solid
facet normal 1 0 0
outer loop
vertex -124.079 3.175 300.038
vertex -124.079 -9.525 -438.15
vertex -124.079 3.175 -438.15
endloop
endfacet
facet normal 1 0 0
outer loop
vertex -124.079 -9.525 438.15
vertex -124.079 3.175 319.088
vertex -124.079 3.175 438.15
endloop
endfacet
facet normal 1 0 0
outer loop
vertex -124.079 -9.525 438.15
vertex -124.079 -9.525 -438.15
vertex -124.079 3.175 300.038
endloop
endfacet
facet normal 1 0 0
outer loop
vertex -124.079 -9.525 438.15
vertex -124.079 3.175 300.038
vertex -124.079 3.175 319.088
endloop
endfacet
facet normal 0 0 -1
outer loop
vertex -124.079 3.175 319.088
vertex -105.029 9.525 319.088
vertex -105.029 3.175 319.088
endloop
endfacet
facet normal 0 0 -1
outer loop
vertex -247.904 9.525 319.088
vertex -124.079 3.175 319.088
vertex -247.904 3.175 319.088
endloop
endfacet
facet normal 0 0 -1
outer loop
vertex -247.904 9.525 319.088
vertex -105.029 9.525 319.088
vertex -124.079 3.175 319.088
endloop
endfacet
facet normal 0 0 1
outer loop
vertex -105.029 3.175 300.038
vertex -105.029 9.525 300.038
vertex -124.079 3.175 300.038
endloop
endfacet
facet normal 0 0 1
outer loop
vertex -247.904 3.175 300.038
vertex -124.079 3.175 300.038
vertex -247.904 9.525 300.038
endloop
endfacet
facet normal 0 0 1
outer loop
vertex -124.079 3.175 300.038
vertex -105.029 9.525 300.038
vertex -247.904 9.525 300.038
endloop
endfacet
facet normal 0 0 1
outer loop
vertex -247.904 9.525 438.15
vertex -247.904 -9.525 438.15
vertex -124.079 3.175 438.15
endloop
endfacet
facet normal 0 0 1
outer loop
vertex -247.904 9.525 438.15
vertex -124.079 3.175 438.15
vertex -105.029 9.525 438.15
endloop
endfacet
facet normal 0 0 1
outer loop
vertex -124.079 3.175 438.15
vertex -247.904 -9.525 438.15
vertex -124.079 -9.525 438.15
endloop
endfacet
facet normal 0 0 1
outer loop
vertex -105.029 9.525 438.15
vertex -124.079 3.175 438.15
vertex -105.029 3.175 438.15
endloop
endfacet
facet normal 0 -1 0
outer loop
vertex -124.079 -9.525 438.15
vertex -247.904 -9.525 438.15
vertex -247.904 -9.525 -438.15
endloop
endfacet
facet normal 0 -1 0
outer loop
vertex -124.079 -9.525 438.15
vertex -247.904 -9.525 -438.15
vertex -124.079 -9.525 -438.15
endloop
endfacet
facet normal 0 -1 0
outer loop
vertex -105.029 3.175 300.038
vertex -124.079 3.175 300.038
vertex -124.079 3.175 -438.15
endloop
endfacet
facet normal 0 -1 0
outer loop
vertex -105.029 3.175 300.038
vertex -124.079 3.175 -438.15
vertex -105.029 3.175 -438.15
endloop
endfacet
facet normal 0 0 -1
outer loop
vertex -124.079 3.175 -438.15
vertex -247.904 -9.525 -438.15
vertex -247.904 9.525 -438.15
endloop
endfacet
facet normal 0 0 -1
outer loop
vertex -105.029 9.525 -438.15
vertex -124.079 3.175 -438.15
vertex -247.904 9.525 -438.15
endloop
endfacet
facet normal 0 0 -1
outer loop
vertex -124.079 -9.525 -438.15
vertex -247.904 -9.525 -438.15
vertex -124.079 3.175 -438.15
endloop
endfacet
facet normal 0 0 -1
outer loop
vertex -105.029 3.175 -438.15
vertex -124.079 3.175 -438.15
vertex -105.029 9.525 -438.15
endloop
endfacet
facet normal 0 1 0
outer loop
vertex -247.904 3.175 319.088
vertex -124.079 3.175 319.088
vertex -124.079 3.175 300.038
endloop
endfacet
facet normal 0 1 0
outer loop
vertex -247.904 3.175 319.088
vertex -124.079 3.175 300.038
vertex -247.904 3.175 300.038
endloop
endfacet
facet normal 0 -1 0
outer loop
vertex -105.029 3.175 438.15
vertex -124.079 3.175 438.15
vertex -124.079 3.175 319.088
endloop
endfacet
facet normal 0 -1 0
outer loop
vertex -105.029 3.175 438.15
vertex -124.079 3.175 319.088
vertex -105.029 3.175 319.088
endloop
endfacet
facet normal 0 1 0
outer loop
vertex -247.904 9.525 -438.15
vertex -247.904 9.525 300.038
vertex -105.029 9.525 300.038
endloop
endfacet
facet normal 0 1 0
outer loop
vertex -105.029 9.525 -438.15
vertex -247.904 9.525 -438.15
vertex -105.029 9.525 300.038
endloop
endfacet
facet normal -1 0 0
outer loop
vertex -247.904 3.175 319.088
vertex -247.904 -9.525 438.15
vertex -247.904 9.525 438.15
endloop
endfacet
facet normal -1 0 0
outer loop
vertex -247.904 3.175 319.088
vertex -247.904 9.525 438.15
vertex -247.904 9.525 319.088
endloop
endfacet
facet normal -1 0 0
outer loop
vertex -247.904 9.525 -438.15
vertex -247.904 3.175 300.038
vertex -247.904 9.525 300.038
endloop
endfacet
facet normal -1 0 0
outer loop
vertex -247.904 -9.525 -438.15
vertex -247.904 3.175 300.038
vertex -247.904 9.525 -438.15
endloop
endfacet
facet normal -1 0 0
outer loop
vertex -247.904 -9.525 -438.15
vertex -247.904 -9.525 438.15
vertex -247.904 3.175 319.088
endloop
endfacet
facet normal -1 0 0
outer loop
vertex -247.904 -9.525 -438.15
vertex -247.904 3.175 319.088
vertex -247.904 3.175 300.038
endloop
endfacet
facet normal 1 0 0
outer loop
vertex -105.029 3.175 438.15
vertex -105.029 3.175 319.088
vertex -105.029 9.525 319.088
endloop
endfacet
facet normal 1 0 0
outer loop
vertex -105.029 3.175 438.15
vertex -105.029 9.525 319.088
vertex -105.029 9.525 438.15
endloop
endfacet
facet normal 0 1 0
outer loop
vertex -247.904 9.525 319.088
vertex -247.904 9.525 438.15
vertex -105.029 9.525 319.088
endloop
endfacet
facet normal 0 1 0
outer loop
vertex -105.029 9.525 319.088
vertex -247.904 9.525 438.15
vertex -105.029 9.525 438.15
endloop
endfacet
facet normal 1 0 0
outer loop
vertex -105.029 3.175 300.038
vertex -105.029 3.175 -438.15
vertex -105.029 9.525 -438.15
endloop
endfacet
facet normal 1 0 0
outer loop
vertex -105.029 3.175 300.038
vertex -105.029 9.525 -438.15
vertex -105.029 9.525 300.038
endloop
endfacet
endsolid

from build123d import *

# Parameters (mm, degrees)
F0_W     = 142.875
F0_H     = 438.15
F1_DEPTH = 9.525
F2_W     = 142.875
F2_H     = 19.05
F3_DEPTH = 6.35
F4_W     = 19.05
F4_H     = 876.3
F5_DEPTH = 12.7


# Not quite as in the source:
# - a feature names something its author has since deleted; it is built from what else it names


with BuildPart() as f1:
    # F0 (on Front) → F1 (new body, symmetric)
    with BuildSketch(Plane.XZ):
        with Locations((-176.4664953259, 219.075)):
            Rectangle(F0_W, F0_H)
        with Locations((-176.4664953259, -219.075)):
            Rectangle(F0_W, F0_H)
    extrude(amount=F1_DEPTH, both=True)

    # F2 (on face) → F3 (cut)
    with BuildSketch(Plane(origin=(0, 9.525, 0), x_dir=(-1, 0, 0), z_dir=(0, 1, 0))):
        with Locations((176.4664953259, 309.5625)):
            Rectangle(F2_W, F2_H)
    extrude(amount=-F3_DEPTH, mode=Mode.SUBTRACT)

    # F4 (on face) → F5 (cut)
    with BuildSketch(Plane.XZ.offset(9.525)):
        with Locations((-114.5539953259, 0)):
            Rectangle(F4_W, F4_H)
    extrude(amount=-F5_DEPTH, mode=Mode.SUBTRACT)


solid = f1.part
